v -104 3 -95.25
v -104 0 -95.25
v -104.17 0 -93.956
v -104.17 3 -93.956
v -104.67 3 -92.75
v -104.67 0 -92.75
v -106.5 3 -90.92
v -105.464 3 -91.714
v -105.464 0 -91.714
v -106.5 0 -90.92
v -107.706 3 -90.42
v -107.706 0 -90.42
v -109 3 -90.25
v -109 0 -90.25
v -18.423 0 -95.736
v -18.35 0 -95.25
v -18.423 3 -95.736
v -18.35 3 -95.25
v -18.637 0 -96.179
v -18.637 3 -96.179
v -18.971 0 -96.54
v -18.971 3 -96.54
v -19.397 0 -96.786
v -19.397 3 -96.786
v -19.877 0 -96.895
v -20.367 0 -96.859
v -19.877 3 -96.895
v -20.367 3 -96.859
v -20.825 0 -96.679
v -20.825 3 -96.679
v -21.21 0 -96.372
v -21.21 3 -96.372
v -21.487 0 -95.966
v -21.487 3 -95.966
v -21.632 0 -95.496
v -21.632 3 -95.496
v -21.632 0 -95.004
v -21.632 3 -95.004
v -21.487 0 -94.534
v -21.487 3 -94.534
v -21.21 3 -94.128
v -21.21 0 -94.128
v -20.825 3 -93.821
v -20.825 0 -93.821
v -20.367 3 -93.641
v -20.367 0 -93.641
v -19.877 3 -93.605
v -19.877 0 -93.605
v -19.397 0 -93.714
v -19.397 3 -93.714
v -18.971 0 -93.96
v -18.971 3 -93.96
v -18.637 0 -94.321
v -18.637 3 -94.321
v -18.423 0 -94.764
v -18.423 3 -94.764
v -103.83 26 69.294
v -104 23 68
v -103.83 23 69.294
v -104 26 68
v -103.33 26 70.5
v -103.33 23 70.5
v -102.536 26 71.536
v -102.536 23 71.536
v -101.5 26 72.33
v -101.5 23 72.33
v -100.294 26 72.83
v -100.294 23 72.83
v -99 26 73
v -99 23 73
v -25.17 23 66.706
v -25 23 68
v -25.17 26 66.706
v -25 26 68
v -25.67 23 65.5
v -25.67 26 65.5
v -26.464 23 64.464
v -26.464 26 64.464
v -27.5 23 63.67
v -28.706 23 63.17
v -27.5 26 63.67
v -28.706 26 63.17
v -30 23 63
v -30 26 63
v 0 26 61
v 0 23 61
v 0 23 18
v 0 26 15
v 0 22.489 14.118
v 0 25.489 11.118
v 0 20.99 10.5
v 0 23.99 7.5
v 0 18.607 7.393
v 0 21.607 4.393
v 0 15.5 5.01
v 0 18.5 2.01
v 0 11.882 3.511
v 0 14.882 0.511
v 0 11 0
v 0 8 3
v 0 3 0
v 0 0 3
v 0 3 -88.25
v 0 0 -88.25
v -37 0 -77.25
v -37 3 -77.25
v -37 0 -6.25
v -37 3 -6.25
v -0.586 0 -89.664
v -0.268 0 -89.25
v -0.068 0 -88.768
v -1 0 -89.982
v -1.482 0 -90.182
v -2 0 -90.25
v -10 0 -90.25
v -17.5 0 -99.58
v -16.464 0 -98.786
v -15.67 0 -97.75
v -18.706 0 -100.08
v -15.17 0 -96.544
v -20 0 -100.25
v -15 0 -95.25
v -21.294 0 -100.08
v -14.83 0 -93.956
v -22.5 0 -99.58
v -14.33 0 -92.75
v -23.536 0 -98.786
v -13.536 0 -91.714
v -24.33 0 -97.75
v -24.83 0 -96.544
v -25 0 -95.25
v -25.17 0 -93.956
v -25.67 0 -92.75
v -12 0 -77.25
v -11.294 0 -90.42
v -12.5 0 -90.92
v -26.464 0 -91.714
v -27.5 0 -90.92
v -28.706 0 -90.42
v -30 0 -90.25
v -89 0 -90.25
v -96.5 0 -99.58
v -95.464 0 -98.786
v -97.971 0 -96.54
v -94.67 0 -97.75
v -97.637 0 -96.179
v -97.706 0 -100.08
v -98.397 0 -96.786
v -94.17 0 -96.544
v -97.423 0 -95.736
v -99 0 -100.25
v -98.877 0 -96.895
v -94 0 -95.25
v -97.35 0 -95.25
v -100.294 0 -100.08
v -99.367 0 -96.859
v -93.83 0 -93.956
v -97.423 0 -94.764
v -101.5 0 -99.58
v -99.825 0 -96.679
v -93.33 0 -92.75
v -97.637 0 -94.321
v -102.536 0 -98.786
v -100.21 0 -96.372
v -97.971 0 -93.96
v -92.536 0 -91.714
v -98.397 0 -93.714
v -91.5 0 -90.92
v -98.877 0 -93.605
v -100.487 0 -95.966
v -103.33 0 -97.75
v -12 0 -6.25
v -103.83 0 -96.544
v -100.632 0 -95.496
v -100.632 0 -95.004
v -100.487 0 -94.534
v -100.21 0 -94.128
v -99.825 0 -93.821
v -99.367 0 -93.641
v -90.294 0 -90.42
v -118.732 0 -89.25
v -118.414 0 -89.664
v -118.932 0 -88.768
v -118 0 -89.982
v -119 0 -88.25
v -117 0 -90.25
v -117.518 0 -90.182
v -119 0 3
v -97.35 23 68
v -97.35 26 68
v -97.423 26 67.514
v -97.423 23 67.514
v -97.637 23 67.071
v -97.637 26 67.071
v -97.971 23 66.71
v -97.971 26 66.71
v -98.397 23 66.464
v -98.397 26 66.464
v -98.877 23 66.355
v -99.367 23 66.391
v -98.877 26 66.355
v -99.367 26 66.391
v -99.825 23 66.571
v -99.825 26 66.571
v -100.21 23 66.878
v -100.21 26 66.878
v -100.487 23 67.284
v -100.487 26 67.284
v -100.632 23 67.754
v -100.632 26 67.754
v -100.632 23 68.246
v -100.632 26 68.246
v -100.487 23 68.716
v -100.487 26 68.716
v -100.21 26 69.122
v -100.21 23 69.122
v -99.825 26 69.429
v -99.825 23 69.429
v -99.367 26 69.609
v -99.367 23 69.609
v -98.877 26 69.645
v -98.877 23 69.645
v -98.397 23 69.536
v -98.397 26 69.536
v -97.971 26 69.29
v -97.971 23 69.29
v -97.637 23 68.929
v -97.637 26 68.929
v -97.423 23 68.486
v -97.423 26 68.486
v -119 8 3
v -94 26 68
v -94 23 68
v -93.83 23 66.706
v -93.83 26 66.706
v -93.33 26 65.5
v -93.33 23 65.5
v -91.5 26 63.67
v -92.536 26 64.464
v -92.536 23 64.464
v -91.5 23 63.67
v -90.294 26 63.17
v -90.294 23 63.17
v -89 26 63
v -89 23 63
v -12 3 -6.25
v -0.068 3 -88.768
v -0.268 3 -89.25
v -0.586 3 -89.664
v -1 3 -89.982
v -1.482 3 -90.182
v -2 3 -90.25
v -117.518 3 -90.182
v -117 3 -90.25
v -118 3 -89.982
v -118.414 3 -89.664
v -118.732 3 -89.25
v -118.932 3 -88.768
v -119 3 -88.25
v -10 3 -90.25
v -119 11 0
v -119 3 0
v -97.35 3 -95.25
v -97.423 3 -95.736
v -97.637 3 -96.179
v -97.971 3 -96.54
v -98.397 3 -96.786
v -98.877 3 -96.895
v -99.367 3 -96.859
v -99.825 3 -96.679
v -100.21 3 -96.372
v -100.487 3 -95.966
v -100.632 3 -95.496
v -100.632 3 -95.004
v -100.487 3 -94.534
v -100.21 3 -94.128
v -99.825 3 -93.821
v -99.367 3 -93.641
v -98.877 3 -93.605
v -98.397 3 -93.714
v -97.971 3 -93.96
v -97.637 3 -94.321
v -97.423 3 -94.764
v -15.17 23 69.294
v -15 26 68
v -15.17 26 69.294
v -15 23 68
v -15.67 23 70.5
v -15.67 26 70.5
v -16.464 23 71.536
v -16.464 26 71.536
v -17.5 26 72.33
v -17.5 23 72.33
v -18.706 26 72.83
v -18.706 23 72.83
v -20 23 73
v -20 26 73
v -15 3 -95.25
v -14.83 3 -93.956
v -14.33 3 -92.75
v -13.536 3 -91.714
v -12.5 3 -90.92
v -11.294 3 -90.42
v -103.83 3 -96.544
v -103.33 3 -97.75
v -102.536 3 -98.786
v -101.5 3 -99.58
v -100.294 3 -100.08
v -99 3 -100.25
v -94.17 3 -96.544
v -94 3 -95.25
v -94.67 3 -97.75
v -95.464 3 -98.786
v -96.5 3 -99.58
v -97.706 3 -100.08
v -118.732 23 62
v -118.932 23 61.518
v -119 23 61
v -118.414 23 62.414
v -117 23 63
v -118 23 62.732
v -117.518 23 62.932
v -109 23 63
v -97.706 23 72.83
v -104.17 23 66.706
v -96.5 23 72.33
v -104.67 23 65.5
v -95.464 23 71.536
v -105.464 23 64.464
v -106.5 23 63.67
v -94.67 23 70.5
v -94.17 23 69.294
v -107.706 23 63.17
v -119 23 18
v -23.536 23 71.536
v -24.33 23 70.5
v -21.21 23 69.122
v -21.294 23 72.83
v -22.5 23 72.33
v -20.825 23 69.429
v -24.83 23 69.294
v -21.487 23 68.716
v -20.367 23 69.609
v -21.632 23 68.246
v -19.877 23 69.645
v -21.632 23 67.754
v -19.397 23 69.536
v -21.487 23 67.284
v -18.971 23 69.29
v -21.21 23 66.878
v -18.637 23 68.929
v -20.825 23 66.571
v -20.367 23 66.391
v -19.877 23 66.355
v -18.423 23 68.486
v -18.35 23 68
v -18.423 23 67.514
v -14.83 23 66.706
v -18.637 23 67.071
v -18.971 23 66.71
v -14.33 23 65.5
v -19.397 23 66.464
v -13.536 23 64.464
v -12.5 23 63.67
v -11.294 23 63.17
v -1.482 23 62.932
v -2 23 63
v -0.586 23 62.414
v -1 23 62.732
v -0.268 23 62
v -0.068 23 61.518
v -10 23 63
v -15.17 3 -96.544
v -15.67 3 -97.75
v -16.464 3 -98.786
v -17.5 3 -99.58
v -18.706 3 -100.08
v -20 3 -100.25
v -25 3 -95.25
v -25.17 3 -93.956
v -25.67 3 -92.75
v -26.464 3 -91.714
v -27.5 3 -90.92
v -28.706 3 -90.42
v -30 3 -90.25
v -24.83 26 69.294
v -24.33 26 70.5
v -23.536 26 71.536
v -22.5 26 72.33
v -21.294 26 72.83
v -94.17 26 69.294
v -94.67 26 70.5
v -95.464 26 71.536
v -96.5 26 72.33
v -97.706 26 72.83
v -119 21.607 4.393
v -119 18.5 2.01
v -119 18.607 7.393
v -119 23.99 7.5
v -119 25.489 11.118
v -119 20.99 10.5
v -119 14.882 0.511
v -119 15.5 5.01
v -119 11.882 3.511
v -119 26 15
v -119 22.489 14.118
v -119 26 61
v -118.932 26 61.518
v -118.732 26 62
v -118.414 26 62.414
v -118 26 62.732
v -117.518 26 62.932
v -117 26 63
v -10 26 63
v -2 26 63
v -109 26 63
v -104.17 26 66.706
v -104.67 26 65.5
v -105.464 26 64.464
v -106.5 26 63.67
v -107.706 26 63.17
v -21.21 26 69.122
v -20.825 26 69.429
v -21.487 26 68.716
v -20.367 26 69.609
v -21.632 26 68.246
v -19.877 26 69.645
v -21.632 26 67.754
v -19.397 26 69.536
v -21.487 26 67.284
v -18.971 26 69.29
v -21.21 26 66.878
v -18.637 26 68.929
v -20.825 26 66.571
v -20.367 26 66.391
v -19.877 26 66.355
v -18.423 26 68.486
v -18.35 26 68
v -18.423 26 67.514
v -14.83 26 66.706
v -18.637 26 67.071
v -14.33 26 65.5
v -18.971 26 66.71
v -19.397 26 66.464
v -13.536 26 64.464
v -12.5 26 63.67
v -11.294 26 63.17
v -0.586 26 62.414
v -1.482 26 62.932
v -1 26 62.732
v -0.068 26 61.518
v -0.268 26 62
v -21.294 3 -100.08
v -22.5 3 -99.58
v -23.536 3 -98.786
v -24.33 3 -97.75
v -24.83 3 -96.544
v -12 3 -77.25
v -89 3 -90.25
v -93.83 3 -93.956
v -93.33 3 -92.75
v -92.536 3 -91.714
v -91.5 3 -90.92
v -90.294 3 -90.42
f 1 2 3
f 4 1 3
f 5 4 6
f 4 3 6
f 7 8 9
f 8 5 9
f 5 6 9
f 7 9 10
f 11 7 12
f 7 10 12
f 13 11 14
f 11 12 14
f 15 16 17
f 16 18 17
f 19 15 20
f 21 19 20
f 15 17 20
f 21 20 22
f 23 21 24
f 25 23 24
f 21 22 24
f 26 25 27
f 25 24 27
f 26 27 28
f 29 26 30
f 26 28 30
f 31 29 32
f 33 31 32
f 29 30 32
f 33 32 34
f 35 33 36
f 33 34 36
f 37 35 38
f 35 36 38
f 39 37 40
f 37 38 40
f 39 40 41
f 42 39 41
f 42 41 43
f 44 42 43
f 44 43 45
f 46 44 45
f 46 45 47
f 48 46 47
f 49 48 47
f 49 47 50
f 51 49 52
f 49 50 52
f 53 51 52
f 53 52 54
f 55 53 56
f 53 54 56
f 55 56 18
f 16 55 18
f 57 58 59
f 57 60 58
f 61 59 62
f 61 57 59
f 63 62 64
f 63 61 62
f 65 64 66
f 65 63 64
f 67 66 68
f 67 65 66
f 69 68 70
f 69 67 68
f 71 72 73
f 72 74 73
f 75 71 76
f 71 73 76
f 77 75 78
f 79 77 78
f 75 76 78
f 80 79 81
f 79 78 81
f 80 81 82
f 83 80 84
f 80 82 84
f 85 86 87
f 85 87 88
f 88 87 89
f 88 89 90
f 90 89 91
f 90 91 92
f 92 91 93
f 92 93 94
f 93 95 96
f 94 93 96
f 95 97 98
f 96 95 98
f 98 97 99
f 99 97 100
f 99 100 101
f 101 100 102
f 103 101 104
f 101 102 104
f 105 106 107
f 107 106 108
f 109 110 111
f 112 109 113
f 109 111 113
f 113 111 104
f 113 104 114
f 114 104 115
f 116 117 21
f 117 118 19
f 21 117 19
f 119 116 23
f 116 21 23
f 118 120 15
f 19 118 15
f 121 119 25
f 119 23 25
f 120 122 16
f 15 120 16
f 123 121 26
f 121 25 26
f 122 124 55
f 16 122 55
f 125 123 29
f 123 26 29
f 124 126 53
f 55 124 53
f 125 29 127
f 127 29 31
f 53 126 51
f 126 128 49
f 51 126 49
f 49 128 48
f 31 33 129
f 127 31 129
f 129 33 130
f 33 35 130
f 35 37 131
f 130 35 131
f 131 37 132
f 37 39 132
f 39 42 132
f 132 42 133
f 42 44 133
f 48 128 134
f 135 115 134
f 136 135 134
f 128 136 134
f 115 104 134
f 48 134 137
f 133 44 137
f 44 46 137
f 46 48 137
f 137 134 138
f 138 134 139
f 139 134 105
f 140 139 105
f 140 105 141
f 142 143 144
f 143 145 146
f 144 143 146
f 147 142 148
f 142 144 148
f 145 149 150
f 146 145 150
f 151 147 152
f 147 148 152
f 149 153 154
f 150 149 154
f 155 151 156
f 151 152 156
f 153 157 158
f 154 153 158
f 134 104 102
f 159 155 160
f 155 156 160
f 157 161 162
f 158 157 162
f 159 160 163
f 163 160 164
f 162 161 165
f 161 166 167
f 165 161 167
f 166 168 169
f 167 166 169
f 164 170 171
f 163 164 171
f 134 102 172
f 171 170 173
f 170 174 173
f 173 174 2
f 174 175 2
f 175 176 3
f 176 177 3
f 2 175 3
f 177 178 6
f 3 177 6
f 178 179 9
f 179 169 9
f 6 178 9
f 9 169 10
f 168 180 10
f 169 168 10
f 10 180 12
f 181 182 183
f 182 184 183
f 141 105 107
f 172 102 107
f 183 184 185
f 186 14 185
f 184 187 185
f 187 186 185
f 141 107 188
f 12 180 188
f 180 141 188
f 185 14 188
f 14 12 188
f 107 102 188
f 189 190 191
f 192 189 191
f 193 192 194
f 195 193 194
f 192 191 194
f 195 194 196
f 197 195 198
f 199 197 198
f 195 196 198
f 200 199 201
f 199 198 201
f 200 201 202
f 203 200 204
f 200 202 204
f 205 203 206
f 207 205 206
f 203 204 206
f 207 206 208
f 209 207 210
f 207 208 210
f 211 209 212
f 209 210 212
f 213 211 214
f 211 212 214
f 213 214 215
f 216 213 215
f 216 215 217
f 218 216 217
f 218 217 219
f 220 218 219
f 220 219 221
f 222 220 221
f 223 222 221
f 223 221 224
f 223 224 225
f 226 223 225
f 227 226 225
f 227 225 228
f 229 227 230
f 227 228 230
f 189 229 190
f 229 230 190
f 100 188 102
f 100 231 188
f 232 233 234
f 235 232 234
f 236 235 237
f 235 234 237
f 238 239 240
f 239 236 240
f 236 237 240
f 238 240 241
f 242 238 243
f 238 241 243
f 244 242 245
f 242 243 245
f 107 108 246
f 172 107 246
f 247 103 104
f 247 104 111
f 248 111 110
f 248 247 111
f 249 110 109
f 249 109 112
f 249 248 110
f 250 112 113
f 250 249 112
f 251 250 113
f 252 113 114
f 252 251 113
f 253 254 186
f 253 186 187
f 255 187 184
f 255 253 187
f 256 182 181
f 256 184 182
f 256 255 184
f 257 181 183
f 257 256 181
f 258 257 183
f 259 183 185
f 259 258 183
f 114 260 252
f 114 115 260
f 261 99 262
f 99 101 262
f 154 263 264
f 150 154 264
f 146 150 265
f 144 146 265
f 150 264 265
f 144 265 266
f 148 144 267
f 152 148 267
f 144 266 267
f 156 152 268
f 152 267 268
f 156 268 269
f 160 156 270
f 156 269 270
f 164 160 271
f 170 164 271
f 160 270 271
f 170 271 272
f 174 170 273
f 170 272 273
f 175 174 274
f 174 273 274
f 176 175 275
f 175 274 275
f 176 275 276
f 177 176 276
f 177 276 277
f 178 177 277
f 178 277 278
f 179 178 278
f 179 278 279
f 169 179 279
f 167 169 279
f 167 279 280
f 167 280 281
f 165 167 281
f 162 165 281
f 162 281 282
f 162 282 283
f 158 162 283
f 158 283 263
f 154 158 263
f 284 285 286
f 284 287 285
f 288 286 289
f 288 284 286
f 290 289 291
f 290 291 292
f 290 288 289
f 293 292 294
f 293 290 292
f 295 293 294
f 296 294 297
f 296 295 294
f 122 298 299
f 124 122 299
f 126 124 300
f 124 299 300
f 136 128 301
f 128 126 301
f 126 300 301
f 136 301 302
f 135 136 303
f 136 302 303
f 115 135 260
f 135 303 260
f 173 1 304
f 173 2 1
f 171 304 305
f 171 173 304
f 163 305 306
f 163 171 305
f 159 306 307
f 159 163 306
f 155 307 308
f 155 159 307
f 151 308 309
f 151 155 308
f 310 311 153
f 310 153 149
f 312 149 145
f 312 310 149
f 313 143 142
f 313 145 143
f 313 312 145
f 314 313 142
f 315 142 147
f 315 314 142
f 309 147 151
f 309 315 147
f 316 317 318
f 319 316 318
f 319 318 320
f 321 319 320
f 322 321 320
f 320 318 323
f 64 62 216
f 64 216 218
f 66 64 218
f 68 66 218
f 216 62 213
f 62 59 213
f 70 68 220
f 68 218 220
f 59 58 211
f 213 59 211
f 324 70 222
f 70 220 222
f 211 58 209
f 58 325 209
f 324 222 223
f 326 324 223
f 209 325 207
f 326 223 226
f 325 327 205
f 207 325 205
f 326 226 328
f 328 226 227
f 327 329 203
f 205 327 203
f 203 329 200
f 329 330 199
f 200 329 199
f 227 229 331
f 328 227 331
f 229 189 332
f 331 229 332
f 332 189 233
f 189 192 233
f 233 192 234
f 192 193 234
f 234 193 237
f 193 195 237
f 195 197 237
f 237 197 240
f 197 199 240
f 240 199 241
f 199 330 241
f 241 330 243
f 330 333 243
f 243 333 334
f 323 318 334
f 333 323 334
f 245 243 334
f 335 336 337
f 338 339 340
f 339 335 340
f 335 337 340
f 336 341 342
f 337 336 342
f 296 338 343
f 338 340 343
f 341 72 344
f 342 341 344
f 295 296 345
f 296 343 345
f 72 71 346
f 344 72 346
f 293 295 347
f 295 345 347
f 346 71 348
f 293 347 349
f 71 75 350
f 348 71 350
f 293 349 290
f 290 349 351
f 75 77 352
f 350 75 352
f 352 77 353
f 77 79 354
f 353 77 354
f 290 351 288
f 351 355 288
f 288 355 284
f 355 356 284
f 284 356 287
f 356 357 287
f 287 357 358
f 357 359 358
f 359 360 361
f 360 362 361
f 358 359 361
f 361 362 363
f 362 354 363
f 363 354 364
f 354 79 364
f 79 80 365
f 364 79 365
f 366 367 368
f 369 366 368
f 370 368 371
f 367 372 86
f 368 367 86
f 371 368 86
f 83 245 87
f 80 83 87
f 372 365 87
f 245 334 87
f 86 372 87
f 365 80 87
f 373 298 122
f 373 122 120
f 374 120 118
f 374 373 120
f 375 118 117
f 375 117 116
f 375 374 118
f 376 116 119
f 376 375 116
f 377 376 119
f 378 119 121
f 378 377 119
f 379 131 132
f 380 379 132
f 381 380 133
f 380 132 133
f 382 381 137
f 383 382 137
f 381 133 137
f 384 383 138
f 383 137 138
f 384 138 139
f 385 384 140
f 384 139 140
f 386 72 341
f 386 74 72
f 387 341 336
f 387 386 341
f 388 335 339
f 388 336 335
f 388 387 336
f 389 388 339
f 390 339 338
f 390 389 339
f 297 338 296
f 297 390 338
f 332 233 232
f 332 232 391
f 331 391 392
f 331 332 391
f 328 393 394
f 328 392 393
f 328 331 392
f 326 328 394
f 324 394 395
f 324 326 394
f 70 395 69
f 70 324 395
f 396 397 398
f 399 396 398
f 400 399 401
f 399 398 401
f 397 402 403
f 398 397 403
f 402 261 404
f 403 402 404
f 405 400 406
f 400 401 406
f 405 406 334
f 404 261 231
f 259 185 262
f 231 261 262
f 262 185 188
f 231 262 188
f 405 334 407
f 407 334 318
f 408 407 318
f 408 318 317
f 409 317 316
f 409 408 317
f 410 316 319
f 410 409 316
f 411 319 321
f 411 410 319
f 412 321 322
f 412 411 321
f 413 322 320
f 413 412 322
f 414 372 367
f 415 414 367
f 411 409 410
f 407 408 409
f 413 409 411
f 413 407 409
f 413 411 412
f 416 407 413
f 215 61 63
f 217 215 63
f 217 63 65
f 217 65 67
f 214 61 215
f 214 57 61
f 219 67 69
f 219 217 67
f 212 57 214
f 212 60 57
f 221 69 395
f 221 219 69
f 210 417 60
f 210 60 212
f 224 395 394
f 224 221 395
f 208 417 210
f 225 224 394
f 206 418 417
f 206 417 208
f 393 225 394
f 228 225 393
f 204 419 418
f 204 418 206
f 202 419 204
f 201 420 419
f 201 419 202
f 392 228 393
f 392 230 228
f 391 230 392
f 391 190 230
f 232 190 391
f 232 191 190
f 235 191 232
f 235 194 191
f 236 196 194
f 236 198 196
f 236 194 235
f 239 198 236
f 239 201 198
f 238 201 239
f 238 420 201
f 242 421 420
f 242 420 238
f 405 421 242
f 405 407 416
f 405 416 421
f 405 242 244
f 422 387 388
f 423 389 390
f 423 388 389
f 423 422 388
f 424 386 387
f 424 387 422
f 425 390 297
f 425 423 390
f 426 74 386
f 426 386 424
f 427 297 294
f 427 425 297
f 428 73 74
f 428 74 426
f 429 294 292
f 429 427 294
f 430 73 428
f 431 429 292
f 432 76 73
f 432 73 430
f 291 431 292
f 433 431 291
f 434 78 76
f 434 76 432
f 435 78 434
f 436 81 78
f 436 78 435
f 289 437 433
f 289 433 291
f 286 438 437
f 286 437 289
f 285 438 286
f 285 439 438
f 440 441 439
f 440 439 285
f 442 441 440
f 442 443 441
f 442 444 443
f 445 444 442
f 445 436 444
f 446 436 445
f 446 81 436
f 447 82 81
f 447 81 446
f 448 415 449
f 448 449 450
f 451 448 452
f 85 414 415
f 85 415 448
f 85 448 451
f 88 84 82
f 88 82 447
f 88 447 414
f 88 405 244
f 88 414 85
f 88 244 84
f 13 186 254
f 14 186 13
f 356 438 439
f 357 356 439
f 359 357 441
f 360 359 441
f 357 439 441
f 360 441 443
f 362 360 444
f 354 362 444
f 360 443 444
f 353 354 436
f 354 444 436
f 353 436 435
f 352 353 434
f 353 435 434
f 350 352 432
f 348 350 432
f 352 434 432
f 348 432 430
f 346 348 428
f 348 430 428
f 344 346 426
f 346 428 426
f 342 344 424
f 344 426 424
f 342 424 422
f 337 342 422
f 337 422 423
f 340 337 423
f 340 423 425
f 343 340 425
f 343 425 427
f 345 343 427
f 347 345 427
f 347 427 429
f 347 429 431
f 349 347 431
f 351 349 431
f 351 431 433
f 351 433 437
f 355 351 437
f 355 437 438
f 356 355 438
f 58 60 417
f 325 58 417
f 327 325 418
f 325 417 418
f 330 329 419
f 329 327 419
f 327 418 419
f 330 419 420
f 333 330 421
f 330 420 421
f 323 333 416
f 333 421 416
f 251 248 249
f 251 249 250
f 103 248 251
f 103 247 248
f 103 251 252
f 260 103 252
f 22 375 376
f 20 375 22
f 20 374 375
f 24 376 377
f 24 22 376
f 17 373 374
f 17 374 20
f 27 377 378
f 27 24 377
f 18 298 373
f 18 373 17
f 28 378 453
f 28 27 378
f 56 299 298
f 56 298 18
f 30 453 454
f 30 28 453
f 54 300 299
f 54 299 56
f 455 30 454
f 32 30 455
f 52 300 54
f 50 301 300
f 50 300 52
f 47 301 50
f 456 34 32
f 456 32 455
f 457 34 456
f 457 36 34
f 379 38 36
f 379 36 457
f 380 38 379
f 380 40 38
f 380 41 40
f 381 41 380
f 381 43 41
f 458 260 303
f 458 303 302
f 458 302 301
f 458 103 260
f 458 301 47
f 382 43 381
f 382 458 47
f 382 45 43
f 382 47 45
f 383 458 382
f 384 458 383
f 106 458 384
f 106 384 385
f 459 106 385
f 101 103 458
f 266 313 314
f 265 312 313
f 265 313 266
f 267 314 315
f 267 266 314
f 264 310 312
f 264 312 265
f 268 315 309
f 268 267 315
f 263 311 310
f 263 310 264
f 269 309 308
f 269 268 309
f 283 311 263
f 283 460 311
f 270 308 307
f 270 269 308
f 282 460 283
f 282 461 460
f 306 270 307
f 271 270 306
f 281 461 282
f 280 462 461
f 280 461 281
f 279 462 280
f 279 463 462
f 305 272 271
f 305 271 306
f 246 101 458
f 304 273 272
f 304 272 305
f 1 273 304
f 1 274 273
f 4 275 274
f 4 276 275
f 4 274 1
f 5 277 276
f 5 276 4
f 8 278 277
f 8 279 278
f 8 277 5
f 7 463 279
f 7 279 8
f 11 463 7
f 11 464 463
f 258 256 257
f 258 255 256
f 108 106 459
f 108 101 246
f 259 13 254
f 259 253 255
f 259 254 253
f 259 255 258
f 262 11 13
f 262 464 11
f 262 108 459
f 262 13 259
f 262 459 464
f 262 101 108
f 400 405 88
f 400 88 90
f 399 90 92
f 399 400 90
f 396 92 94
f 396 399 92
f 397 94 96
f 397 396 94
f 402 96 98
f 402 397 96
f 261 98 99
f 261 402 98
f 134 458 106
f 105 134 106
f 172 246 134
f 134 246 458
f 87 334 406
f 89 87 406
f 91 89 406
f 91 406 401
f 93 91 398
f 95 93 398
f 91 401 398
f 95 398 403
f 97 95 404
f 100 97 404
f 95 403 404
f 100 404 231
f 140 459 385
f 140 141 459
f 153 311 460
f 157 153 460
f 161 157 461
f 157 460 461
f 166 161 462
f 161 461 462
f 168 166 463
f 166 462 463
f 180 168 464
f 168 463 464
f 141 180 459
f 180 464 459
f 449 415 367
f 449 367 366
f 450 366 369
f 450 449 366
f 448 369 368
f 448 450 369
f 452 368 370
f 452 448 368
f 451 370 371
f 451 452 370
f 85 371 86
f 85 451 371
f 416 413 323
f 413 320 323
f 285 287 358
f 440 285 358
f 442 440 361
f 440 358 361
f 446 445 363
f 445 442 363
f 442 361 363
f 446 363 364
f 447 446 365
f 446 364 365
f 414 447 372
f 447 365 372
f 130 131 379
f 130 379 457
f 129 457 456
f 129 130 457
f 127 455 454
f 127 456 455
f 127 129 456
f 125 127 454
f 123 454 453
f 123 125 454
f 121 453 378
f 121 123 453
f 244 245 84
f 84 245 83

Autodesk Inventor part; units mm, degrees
ref_plane "YZ Plane" through (0, 0, 0) normal (1, 0, 0) x (0, 1, 0)
ref_plane "XZ Plane" through (0, 0, 0) normal (0, 1, 0) x (-1, 0, 0)
ref_plane "XY Plane" through (0, 0, 0) normal (0, 0, 1) x (1, 0, 0)
sketch "Sketch1" plane through (0, 0, 0) normal (0, 1, 0) x (-1, 0, 0)
  line L0 (0, 0) -> (119, 0)
  line L1 (119, 0) -> (119, -90.25)
  line L2 (119, -90.25) -> (0, -90.25)
  line L3 (0, -90.25) -> (0, 0)
  dimension "d0" = 119
  dimension "d1" = 90.25
extrude "Extrusion1" add sketch "Sketch1" along normal blind 3
sketch "Sketch2" plane through (-119, 0, 0) normal (0, 0, 1) x (1, 0, 0)
  line L0 (119, 0) -> (0, 0) projected
  line L1 (0, 0) -> (119, 0)
  line L2 (119, 0) -> (119, 23)
  line L3 (119, 23) -> (0, 23)
  line L4 (0, 23) -> (0, 0)
  dimension "d4" = 23
extrude "Extrusion2" add sketch "Sketch2" along normal blind 3
sketch "Sketch3" plane through (-119, 23, 0) normal (0, 1, 0) x (1, 0, 0)
  line L0 (119, 0) -> (119, 90.25) projected
  line L1 (119, 0) -> (0, 0)
  line L2 (0, 0) -> (0, -63)
  line L3 (0, -63) -> (119, -63)
  line L4 (119, -63) -> (119, 0)
  dimension "d7" = 119
  dimension "d8" = 63
extrude "Extrusion3" add sketch "Sketch3" along normal blind 3
fillet "Fillet1" radius 15 2 edges at (-59.5, 26, 0) (-59.5, 23, 3)
sketch "Sketch4" plane through (0, 0, -90.25) normal (0, 0, -1) x (-1, 0, 0)
  line L0 (0, 3) -> (119, 3) projected
  line L1 (15, 3) -> (25, 3)
  line L2 (25, 3) -> (25, 0)
  line L3 (25, 0) -> (15, 0)
  line L4 (15, 0) -> (15, 3)
  line L5 (0, 0) -> (0, 3) projected
  line L6 (94, 3) -> (104, 3)
  line L7 (104, 3) -> (104, 0)
  line L8 (104, 0) -> (94, 0)
  line L9 (94, 0) -> (94, 3)
  line L10 (119, 0) -> (119, 3) projected
  point P0 (15, 1.5)
  point P1 (0, 1.5)
  point P2 (104, 1.5)
  point P3 (119, 1.5)
  dimension "d12" = 10
  dimension "d13" = 3
  dimension "d14" = 15
  dimension "d15" = 10
  dimension "d16" = 3
  dimension "d17" = 15
extrude "Extrusion4" add sketch "Sketch4" along normal blind 10
sketch "Sketch5" plane through (-119, 23, 63) normal (0, 0, 1) x (1, 0, 0)
  line L0 (0, 3) -> (119, 3) projected
  line L1 (15, 3) -> (25, 3)
  line L2 (25, 3) -> (25, 0)
  line L3 (25, 0) -> (15, 0)
  line L4 (15, 0) -> (15, 3)
  line L5 (94, 3) -> (104, 3)
  line L6 (104, 3) -> (104, 0)
  line L7 (104, 0) -> (94, 0)
  line L8 (94, 0) -> (94, 3)
  line L9 (0, 0) -> (0, 3) projected
  line L10 (119, 0) -> (119, 3) projected
  point P0 (119, -23)
  point P1 (15, 1.5)
  point P2 (0, 1.5)
  point P3 (119, 1.5)
  point P4 (104, 1.5)
  point P5 (104, 3)
  point P6 (94, 3)
  point P7 (25, 3)
  dimension "d20" = 10
  dimension "d21" = 3
  dimension "d22" = 10
  dimension "d23" = 3
  dimension "d24" = 15
  dimension "d25" = 15
extrude "Extrusion5" add sketch "Sketch5" along normal blind 10
sketch "Sketch6" plane through (-119, 26, 0) normal (0, 1, 0) x (1, 0, 0)
  circle A0 centre (20, -68) radius 1.65
  line L0 (15, -63) -> (15, -73) projected
  line L1 (25, -73) -> (15, -73) projected
  circle A1 centre (99, -68) radius 1.65
  line L2 (104, -73) -> (94, -73) projected
  line L3 (94, -63) -> (94, -73) projected
  point P0 (119, 0)
  point P1 (15, -68)
  point P2 (99, -73)
  dimension "d28" = 3.3
  dimension "d29" = 5
  dimension "d30" = 5
  dimension "d31" = 3.3
  dimension "d32" = 5
  dimension "d33" = 5
extrude "Extrusion6" cut sketch "Sketch6" against normal blind 5
sketch "Sketch7" plane through (0, 3, 0) normal (0, 1, 0) x (1, 0, 0)
  circle A0 centre (-99, 95.25) radius 1.65
  circle A1 centre (-20, 95.25) radius 1.65
  line L0 (-104, 90.25) -> (-104, 100.25) projected
  line L1 (-104, 100.25) -> (-94, 100.25) projected
  line L2 (-25, 90.25) -> (-25, 100.25) projected
  line L3 (-25, 100.25) -> (-15, 100.25) projected
  point P0 (0, 0)
  point P1 (-104, 95.25)
  dimension "d36" = 3.3
  dimension "d37" = 3.3
  dimension "d38" = 5
  dimension "d39" = 5
  dimension "d40" = 5
  dimension "d41" = 5
extrude "Extrusion7" cut sketch "Sketch7" against normal blind 5
fillet "Fillet2" radius 5 16 edges at (-15, 24.5, 73) (-15, 24.5, 63) (-25, 24.5, 73) (-25, 24.5, 63) (-104, 24.5, 63) (-104, 24.5, 73) (-94, 24.5, 73) (-94, 24.5, 63) (-15, 1.5, -90.25) (-15, 1.5, -100.25) (-25, 1.5, -100.25) (-25, 1.5, -90.25) (-94, 1.5, -100.25) (-104, 1.5, -100.25) (-104, 1.5, -90.25) (-94, 1.5, -90.25)
fillet "Fillet3" radius 2 4 edges at (0, 1.5, -90.25) (-119, 1.5, -90.25) (-119, 24.5, 63) (0, 24.5, 63)
sketch "Sketch8" plane through (0, 3, 0) normal (0, 1, 0) x (1, 0, 0)
  line L0 (-37, 6.25) -> (-12, 6.25)
  line L1 (-12, 6.25) -> (-12, 77.25)
  line L2 (-12, 77.25) -> (-37, 77.25)
  line L3 (-37, 77.25) -> (-37, 6.25)
  line L4 (0, 0) -> (0, 88.25) projected
  line L5 (-2, 90.25) -> (-10, 90.25) projected
  dimension "d46" = 25
  dimension "d47" = 71
  dimension "d48" = 12
  dimension "d49" = 13
extrude "Extrusion8" cut sketch "Sketch8" against normal blind 5
equation "\"d34\" = d30"
equation "\"d42\" = d30"
equation "\"d50\" = d30"
properties part number "top"
